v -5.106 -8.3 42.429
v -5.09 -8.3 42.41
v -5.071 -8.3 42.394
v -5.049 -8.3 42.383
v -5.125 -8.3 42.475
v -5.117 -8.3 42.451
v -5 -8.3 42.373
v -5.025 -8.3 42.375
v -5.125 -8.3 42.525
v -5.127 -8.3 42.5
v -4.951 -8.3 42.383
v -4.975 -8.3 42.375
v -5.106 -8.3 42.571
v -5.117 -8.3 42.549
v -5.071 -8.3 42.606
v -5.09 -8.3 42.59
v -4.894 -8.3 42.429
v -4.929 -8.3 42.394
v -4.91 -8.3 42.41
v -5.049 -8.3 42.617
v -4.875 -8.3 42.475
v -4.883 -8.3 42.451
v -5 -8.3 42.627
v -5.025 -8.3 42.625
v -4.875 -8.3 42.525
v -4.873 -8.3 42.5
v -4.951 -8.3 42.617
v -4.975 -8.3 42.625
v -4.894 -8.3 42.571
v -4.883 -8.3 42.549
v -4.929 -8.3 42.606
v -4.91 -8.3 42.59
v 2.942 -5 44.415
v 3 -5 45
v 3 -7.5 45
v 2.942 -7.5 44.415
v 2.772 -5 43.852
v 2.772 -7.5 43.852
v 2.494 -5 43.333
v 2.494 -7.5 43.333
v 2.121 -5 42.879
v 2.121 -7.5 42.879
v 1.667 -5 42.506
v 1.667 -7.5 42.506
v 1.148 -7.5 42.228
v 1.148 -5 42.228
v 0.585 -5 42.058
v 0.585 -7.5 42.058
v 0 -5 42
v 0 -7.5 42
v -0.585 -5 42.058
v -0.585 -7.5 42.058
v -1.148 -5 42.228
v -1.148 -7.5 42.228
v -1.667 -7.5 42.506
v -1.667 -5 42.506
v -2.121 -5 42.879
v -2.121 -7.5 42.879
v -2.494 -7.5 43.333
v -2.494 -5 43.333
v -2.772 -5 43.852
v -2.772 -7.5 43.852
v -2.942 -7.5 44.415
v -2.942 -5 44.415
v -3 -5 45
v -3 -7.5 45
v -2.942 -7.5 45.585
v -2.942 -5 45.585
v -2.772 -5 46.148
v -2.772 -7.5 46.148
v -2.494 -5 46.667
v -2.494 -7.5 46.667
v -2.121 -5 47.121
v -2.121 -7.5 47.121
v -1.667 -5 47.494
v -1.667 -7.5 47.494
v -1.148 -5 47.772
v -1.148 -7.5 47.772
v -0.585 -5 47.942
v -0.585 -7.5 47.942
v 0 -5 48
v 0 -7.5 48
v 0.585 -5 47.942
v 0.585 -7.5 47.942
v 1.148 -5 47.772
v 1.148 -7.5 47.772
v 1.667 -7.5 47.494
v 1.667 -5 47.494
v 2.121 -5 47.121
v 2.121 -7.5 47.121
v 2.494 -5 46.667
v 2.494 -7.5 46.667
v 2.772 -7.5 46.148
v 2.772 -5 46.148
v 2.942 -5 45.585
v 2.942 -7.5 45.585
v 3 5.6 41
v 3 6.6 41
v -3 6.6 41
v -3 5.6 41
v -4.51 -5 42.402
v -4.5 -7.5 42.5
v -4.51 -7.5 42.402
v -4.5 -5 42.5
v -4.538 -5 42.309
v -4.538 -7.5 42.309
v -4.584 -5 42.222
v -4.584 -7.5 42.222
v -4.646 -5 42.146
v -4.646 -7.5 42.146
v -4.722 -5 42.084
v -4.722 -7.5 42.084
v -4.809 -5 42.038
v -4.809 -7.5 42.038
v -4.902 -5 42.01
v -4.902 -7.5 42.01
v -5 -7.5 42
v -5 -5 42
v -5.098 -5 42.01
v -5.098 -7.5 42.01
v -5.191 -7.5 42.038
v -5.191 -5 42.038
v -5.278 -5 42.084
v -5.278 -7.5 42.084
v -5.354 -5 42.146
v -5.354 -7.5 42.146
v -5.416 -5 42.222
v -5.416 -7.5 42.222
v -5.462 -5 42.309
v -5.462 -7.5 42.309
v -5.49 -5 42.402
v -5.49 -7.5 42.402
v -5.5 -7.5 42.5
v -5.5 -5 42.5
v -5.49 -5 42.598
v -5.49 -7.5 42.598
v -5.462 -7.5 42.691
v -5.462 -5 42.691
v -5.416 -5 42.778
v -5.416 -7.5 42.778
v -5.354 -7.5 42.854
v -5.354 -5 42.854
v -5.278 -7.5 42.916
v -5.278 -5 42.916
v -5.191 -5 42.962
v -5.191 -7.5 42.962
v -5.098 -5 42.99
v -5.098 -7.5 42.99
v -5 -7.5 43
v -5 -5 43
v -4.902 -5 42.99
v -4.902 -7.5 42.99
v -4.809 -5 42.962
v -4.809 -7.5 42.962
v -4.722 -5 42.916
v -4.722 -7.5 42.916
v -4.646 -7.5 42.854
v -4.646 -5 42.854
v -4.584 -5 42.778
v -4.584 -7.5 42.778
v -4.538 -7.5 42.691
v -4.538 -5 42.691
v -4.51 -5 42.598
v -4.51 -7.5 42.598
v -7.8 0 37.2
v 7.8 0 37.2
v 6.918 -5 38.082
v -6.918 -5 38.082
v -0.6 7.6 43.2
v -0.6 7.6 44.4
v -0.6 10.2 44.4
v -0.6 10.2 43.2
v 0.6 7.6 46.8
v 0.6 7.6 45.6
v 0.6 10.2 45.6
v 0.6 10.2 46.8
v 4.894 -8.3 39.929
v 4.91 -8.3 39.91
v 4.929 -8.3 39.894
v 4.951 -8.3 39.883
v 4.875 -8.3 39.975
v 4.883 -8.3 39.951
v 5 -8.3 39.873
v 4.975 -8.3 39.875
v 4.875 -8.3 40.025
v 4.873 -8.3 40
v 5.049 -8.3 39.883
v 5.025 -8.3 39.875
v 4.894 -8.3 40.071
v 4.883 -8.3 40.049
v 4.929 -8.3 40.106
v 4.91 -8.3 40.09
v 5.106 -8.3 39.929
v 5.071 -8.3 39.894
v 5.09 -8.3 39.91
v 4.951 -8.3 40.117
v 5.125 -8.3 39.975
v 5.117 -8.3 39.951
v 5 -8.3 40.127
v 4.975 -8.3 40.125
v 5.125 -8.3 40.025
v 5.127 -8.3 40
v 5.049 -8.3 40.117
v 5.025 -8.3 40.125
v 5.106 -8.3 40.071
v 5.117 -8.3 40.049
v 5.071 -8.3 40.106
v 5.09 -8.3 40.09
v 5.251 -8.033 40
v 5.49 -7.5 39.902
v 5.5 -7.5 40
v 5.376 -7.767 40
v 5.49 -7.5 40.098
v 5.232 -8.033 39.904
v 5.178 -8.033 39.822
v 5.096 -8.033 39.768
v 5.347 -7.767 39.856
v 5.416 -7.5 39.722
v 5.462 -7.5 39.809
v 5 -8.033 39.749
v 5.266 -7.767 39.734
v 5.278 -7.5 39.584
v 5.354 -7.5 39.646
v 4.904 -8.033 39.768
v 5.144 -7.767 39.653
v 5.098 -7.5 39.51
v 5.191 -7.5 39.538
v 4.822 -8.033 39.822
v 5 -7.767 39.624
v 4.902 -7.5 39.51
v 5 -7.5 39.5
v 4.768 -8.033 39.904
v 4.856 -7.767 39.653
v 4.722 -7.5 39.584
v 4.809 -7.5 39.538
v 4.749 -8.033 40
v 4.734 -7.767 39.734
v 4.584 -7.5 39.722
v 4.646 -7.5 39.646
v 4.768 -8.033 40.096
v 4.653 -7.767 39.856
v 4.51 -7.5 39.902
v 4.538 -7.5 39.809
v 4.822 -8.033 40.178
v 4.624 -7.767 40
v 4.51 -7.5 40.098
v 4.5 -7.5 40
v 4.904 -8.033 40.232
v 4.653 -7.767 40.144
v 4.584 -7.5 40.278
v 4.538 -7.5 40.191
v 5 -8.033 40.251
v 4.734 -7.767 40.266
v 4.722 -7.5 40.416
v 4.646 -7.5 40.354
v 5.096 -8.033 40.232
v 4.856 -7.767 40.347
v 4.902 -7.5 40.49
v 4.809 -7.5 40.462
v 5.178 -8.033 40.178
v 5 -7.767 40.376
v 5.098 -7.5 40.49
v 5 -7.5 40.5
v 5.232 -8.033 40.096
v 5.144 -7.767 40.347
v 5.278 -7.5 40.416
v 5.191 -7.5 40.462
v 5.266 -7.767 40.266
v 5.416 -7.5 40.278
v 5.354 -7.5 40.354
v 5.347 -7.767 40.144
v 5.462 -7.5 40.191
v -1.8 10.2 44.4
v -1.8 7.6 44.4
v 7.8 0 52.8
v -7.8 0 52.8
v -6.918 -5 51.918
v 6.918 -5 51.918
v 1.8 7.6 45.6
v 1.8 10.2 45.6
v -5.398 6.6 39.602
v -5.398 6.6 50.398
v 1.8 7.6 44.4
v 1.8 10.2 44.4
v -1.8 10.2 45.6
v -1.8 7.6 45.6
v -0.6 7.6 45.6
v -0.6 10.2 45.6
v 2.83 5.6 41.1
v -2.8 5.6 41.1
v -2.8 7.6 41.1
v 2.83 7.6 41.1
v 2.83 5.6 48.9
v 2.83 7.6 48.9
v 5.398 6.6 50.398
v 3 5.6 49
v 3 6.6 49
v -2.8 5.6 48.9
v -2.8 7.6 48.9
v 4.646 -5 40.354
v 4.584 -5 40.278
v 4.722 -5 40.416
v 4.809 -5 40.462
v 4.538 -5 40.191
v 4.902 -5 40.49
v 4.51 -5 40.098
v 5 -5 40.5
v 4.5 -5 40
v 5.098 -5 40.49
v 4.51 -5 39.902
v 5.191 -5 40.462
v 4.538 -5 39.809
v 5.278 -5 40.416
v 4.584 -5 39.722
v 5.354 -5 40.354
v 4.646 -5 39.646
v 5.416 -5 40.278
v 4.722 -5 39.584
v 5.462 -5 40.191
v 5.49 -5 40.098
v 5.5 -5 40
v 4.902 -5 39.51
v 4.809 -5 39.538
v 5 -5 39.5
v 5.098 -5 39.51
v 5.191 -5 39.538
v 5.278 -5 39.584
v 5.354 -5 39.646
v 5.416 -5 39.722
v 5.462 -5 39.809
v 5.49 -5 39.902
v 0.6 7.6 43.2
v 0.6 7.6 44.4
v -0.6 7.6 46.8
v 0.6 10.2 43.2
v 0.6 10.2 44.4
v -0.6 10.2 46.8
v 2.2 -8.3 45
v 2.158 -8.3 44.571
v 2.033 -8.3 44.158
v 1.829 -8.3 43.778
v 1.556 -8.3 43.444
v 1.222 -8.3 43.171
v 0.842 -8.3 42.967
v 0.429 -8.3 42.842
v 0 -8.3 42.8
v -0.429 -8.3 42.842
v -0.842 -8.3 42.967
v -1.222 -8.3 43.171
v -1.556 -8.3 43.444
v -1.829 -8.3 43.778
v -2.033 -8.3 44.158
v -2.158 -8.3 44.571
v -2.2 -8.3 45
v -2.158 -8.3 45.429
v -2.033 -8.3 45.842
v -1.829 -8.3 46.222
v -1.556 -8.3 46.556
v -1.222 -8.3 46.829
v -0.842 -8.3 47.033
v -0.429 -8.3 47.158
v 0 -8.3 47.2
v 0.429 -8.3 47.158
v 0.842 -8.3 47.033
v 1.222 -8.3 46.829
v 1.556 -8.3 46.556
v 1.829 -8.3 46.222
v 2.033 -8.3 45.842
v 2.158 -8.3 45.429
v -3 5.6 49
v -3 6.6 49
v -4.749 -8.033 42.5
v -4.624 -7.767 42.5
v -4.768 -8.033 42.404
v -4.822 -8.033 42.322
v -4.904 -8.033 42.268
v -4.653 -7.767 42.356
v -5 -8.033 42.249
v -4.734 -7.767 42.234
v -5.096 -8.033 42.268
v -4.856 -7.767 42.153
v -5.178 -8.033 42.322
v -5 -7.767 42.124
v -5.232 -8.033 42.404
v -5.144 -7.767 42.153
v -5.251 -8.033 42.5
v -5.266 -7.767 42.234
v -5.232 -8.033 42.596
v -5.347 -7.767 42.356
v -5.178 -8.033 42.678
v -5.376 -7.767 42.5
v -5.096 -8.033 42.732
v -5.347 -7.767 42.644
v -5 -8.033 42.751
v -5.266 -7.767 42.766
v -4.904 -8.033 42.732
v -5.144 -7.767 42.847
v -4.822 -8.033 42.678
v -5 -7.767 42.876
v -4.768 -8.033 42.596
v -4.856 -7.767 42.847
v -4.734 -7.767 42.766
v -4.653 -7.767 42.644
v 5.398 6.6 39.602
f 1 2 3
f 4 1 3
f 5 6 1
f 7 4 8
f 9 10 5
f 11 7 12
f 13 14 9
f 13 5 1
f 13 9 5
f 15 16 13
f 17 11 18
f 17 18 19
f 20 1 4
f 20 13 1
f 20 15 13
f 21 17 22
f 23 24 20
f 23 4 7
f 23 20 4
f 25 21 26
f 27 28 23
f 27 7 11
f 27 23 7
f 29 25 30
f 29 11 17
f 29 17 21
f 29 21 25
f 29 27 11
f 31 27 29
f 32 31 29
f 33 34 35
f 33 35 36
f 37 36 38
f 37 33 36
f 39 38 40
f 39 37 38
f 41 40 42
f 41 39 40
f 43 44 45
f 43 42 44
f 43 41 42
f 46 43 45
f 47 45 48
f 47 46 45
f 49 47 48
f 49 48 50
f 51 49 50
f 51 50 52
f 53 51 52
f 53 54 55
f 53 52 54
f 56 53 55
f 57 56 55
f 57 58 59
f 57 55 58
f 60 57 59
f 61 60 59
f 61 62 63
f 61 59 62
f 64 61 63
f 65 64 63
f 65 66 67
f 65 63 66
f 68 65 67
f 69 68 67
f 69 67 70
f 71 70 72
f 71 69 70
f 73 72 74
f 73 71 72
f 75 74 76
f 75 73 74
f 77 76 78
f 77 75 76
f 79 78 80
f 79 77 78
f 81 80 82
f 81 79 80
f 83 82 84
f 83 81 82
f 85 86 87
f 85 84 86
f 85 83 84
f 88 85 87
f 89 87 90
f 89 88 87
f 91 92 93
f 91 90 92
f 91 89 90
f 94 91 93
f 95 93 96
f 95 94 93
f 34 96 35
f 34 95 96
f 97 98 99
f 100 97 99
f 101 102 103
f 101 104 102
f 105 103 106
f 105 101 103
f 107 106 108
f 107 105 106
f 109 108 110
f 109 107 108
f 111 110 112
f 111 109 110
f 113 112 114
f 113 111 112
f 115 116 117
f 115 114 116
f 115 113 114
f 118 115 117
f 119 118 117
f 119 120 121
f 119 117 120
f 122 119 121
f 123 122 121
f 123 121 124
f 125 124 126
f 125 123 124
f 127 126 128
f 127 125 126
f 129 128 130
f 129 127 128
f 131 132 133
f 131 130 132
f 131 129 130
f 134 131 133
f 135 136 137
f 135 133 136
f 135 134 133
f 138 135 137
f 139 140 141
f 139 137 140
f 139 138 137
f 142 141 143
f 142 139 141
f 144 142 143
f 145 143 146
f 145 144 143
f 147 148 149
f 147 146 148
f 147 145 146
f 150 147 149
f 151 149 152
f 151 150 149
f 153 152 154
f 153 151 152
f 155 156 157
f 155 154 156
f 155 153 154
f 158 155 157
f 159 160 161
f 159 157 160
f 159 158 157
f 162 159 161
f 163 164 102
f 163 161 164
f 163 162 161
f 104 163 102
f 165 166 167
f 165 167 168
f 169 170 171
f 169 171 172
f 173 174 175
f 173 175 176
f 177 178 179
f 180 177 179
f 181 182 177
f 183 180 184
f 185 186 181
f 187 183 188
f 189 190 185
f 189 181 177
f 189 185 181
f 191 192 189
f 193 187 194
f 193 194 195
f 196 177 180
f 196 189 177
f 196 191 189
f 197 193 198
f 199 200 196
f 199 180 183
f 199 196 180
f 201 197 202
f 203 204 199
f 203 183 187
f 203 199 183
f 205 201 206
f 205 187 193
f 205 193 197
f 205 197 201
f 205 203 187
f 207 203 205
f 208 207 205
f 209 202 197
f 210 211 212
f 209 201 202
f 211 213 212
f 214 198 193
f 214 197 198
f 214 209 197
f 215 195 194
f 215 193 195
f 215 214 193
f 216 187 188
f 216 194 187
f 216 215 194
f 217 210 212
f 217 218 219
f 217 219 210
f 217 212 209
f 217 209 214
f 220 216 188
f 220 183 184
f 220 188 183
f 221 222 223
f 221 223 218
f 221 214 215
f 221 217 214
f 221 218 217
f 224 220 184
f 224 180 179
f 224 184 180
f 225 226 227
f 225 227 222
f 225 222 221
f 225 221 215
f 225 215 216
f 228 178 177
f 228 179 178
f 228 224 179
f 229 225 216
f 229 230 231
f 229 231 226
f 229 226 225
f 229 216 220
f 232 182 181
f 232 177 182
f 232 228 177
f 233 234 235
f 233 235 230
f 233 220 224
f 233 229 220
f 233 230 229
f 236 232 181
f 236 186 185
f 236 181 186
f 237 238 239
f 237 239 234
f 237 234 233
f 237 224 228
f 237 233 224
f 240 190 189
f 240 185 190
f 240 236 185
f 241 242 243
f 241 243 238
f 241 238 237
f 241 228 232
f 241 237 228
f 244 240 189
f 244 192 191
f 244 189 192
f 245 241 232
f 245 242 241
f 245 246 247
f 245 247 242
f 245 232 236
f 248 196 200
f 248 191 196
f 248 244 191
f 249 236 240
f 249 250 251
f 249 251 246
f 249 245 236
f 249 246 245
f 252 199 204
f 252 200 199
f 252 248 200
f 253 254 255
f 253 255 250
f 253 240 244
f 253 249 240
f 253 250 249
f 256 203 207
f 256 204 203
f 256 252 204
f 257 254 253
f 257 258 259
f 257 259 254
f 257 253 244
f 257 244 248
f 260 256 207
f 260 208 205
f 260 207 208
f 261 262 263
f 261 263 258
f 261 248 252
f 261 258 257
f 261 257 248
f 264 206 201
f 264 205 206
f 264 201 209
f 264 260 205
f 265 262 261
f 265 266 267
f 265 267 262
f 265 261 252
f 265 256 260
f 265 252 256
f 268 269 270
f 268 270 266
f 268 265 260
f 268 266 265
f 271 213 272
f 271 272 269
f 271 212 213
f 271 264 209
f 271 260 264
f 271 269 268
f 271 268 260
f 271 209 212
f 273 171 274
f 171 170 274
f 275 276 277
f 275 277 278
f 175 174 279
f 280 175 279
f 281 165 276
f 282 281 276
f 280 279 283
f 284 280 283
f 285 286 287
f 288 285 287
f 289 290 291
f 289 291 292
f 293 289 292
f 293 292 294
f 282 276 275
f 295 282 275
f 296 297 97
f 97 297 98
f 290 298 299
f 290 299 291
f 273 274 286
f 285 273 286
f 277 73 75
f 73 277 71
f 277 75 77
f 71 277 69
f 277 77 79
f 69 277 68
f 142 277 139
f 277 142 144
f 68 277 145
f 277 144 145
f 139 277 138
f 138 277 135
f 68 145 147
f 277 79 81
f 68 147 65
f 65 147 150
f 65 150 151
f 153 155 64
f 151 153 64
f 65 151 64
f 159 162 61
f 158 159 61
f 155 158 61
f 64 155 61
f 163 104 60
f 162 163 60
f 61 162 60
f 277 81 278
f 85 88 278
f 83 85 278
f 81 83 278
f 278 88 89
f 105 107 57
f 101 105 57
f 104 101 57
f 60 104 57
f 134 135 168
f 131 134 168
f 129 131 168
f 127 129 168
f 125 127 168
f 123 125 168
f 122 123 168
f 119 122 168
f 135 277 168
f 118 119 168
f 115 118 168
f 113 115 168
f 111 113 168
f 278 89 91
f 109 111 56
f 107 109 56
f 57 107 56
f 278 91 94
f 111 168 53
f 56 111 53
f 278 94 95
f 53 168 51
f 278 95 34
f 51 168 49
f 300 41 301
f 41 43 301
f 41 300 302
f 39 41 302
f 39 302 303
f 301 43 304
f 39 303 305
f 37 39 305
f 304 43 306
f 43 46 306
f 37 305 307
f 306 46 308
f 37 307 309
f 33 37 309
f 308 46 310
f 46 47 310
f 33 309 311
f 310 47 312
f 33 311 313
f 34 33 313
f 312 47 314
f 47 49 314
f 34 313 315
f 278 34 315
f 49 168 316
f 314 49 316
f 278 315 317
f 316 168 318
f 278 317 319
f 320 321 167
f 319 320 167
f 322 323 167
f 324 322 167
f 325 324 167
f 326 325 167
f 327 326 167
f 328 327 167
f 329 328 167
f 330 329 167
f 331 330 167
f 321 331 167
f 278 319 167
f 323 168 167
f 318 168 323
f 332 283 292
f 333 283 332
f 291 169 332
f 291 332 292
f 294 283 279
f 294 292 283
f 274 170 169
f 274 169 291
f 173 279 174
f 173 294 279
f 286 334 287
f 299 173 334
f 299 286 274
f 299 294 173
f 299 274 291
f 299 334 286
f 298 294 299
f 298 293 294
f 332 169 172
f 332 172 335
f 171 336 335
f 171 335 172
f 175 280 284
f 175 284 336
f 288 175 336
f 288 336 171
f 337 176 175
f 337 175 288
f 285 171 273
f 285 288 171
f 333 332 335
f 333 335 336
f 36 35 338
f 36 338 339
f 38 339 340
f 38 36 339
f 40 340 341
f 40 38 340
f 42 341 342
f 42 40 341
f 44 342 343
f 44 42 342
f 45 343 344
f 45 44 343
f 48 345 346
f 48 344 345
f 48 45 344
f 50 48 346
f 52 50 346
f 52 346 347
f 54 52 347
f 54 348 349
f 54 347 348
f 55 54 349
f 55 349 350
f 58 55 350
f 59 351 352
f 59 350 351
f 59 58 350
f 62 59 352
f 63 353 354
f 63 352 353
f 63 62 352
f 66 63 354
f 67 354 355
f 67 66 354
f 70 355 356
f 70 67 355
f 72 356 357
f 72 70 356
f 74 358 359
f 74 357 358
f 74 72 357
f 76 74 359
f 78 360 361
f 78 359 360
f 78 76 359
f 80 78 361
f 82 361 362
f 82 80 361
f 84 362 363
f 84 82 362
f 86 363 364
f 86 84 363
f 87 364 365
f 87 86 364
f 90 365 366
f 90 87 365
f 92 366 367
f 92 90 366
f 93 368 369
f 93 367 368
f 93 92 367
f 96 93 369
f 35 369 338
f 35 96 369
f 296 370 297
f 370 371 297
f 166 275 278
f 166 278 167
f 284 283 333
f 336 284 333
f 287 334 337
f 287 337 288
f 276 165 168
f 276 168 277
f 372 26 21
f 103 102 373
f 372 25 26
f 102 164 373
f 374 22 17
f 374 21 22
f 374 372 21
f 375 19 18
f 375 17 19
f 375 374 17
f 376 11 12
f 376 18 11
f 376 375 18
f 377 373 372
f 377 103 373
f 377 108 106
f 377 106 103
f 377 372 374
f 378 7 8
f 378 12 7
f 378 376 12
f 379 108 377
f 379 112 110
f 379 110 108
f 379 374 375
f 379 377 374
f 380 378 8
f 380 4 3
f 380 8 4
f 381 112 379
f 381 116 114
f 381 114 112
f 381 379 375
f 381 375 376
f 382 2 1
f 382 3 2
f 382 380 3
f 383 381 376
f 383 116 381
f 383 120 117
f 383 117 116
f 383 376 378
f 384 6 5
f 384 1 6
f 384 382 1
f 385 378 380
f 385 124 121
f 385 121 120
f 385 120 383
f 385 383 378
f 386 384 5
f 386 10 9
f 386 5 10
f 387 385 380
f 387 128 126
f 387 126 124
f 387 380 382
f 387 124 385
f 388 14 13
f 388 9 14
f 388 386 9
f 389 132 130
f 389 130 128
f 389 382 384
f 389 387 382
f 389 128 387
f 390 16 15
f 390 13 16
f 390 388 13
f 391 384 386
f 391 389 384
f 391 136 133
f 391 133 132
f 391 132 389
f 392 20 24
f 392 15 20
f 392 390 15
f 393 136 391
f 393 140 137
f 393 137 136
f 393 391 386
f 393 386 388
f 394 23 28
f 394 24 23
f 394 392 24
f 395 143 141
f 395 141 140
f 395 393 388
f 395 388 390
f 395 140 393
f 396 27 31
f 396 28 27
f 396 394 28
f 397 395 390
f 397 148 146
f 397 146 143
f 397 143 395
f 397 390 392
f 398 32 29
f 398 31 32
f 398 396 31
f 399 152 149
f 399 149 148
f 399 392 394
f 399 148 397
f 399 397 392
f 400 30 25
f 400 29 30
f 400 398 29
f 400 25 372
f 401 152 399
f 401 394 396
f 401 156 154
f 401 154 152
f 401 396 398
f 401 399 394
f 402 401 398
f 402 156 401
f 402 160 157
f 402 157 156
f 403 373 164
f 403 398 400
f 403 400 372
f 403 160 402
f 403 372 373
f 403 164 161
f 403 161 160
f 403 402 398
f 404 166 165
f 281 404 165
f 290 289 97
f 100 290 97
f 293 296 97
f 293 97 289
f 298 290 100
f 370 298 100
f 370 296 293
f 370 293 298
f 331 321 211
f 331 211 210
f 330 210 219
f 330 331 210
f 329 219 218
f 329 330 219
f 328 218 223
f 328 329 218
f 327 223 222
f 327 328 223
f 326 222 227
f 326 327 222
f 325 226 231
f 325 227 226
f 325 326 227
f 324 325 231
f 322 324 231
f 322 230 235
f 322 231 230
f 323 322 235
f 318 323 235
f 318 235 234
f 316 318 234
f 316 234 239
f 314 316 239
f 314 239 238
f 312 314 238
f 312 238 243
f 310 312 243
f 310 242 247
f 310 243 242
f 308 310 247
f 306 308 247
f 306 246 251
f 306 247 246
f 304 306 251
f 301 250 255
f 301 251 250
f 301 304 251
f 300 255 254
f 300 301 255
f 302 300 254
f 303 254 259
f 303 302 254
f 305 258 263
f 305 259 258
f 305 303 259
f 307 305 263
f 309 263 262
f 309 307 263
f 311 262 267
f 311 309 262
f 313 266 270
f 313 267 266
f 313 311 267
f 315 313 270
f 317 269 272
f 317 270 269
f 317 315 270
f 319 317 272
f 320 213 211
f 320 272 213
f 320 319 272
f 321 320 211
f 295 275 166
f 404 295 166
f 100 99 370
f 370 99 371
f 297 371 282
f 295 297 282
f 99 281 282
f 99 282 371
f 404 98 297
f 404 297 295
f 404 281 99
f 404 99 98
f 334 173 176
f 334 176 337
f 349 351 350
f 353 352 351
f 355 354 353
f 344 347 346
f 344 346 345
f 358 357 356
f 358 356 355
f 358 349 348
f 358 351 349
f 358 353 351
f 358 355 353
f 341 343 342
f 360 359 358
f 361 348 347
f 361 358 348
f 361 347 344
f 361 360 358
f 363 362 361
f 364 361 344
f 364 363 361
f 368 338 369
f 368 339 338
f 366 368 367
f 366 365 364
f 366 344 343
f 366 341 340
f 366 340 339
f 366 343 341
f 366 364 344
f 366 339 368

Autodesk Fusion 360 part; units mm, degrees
sketch "Sketch1" plane through (0, 0, 0) normal (0, 1, 0) x (1, 0, 0)
sketch "Sketch2" plane through (0, 0, 0) normal (0, 1, 0) x (1, 0, 0)
sketch "Sketch3" plane through (0, 0, 0) normal (0, 1, 0) x (1, 0, 0)
  line L0 (-7.8, -52.8) -> (7.8, -52.8)
  line L1 (7.8, -52.8) -> (7.8, -37.2)
  line L2 (7.8, -37.2) -> (-7.8, -37.2)
  line L3 (-7.8, -37.2) -> (-7.8, -52.8)
  line L4 (-7.8, -52.8) -> (7.8, -37.2) construction
  line L5 (7.8, -52.8) -> (-7.8, -37.2) construction
  point P0 (0, -45)
  dimension "d3" = 15.6
  dimension "d4" = 15.6
extrude "Extrude1" add sketch "Sketch3" along normal blind 6.6 draft -20 makes body 1
sketch "Sketch4" plane through (0, 0, 0) normal (1, 0, 0) x (0, 0, -1)
extrude "Extrude2" add 1 faces at (-2.6, 0, 42.4) along direction (0, -1, 0) blind 5 draft -10 on bodies 1 bodies 1
sketch "Sketch5" plane through (0, 6.6, 0) normal (0, 1, 0) x (-1, 0, 0)
  line L0 (-5.3978, 39.6022) -> (5.3978, 39.6022)
  line L1 (5.3978, 39.6022) -> (5.3978, 50.3978)
  line L2 (5.3978, 50.3978) -> (-5.3978, 50.3978)
  line L3 (-5.3978, 50.3978) -> (-5.3978, 39.6022)
  line L4 (-3, 41) -> (3, 41)
  line L5 (3, 41) -> (3, 49)
  line L6 (3, 49) -> (-3, 49)
  line L7 (-3, 49) -> (-3, 41)
  line L8 (-3, 41) -> (3, 49) construction
  line L9 (3, 41) -> (-3, 49) construction
  point P0 (0, 45)
extrude "Extrude3" cut sketch "Sketch5" against normal blind 1 contours L4 L5 L6 L7 bodies 1
sketch "Sketch6" plane through (0, 5.6, 0) normal (0, 1, 0) x (-1, 0, 0)
  line L0 (-3, 49) -> (-3, 41)
  line L1 (-3, 41) -> (3, 41)
  line L2 (3, 41) -> (3, 49)
  line L3 (3, 49) -> (-3, 49)
  line L4 (2.8, 41.1) -> (-2.8305, 41.1)
  line L5 (-2.8305, 41.1) -> (-2.8305, 48.9)
  line L6 (-2.8305, 48.9) -> (2.8, 48.9)
  line L7 (2.8, 48.9) -> (2.8, 41.1)
  line L8 (2.8, 41.1) -> (-2.8305, 48.9) construction
  line L9 (-2.8305, 41.1) -> (2.8, 48.9) construction
  point P0 (-0.0152, 45)
extrude "Extrude4" add sketch "Sketch6" along normal blind 2 contours L4 L5 L6 L7 bodies 1
sketch "Sketch7" plane through (0, 7.6, 0) normal (0, 1, 0) x (-1, 0, 0)
  line L0 (2.8, 48.9) -> (-2.8305, 48.9)
  line L1 (-2.8305, 48.9) -> (-2.8305, 41.1)
  line L2 (-2.8305, 41.1) -> (2.8, 41.1)
  line L3 (2.8, 41.1) -> (2.8, 48.9)
  line L4 (0.6, 43.2) -> (-0.6, 43.2)
  line L5 (-0.6, 43.2) -> (-0.6, 46.8)
  line L6 (-0.6, 46.8) -> (0.6, 46.8)
  line L7 (0.6, 46.8) -> (0.6, 43.2)
  line L8 (0.6, 43.2) -> (-0.6, 46.8) construction
  line L9 (-0.6, 43.2) -> (0.6, 46.8) construction
  line L10 (-1.8, 44.4) -> (1.8, 44.4)
  line L11 (1.8, 44.4) -> (1.8, 45.6)
  line L12 (1.8, 45.6) -> (-1.8, 45.6)
  line L13 (-1.8, 45.6) -> (-1.8, 44.4)
  line L14 (-1.8, 44.4) -> (1.8, 45.6) construction
  line L15 (1.8, 44.4) -> (-1.8, 45.6) construction
  point P0 (0, 45)
  point P1 (0, 45)
extrude "Extrude5" add sketch "Sketch7" along normal blind 3.2 contours L4 L5 L7 L10 | L5 L7 L10 L12 | L7 L10 L11 L12 | L5 L10 L12 L13 | L5 L6 L7 L12 bodies 1
sketch "Sketch8" plane through (-2.8, 0, 0) normal (-1, 0, 0) x (0, 0, 1)
  line L0 (41.1, 5.6) -> (48.9, 5.6)
  line L1 (48.9, 5.6) -> (48.9, 7.6)
  line L2 (48.9, 7.6) -> (41.1, 7.6)
  line L3 (41.1, 7.6) -> (41.1, 5.6)
extrude "Extrude6" cut 1 faces at (1.4, 10.8, 45.2) along direction (0, -1, 0) blind 0.6 on bodies 1 bodies 1
sketch "Sketch9" plane through (0, -5, 0) normal (0, -1, 0) x (1, 0, 0)
  line L0 (6.9184, 51.9184) -> (-6.9184, 51.9184)
  line L1 (-6.9184, 51.9184) -> (-6.9184, 38.0816)
  line L2 (-6.9184, 38.0816) -> (6.9184, 38.0816)
  line L3 (6.9184, 38.0816) -> (6.9184, 51.9184)
  circle A0 centre (0, 45) radius 3
extrude "Extrude7" add sketch "Sketch9" along normal blind 2.5 contours A0 bodies 1
extrude "Extrude8" add 1 faces at (0.8808, -7.5, 44.8347) along direction (0, -1, 0) blind 0.8 draft -45 on bodies 1 bodies 1
sketch "Sketch10" plane through (0, -5, 0) normal (0, -1, 0) x (1, 0, 0)
  circle A0 centre (0, 45) radius 3
  line L0 (6.9184, 51.9184) -> (-6.9184, 51.9184)
  line L1 (-6.9184, 51.9184) -> (-6.9184, 38.0816)
  line L2 (-6.9184, 38.0816) -> (6.9184, 38.0816)
  line L3 (6.9184, 38.0816) -> (6.9184, 51.9184)
  circle A1 centre (-5, 42.5) radius 0.5
  circle A2 centre (5, 40) radius 0.5
extrude "Extrude9" add sketch "Sketch10" along normal blind 2.5 contours A1 | A2 bodies 1
extrude "Extrude10" add 2 faces at (-5.0609, -7.5, 42.6551) (4.9391, -7.5, 40.1551) along direction (0, -1, 0) blind 0.8 draft -25 on bodies 1 bodies 1
sketch "Sketch11" plane through (-2.8, 0, 0) normal (-1, 0, 0) x (0, 0, 1)
copy_body "Body->Comp1" bodies 1 removing the originals makes body 2 in component "Switch"
component "Switch" placed x (1, 0, 0) y (0, 1, 0) z (0, 0, 1) at (0, 0, 0)
